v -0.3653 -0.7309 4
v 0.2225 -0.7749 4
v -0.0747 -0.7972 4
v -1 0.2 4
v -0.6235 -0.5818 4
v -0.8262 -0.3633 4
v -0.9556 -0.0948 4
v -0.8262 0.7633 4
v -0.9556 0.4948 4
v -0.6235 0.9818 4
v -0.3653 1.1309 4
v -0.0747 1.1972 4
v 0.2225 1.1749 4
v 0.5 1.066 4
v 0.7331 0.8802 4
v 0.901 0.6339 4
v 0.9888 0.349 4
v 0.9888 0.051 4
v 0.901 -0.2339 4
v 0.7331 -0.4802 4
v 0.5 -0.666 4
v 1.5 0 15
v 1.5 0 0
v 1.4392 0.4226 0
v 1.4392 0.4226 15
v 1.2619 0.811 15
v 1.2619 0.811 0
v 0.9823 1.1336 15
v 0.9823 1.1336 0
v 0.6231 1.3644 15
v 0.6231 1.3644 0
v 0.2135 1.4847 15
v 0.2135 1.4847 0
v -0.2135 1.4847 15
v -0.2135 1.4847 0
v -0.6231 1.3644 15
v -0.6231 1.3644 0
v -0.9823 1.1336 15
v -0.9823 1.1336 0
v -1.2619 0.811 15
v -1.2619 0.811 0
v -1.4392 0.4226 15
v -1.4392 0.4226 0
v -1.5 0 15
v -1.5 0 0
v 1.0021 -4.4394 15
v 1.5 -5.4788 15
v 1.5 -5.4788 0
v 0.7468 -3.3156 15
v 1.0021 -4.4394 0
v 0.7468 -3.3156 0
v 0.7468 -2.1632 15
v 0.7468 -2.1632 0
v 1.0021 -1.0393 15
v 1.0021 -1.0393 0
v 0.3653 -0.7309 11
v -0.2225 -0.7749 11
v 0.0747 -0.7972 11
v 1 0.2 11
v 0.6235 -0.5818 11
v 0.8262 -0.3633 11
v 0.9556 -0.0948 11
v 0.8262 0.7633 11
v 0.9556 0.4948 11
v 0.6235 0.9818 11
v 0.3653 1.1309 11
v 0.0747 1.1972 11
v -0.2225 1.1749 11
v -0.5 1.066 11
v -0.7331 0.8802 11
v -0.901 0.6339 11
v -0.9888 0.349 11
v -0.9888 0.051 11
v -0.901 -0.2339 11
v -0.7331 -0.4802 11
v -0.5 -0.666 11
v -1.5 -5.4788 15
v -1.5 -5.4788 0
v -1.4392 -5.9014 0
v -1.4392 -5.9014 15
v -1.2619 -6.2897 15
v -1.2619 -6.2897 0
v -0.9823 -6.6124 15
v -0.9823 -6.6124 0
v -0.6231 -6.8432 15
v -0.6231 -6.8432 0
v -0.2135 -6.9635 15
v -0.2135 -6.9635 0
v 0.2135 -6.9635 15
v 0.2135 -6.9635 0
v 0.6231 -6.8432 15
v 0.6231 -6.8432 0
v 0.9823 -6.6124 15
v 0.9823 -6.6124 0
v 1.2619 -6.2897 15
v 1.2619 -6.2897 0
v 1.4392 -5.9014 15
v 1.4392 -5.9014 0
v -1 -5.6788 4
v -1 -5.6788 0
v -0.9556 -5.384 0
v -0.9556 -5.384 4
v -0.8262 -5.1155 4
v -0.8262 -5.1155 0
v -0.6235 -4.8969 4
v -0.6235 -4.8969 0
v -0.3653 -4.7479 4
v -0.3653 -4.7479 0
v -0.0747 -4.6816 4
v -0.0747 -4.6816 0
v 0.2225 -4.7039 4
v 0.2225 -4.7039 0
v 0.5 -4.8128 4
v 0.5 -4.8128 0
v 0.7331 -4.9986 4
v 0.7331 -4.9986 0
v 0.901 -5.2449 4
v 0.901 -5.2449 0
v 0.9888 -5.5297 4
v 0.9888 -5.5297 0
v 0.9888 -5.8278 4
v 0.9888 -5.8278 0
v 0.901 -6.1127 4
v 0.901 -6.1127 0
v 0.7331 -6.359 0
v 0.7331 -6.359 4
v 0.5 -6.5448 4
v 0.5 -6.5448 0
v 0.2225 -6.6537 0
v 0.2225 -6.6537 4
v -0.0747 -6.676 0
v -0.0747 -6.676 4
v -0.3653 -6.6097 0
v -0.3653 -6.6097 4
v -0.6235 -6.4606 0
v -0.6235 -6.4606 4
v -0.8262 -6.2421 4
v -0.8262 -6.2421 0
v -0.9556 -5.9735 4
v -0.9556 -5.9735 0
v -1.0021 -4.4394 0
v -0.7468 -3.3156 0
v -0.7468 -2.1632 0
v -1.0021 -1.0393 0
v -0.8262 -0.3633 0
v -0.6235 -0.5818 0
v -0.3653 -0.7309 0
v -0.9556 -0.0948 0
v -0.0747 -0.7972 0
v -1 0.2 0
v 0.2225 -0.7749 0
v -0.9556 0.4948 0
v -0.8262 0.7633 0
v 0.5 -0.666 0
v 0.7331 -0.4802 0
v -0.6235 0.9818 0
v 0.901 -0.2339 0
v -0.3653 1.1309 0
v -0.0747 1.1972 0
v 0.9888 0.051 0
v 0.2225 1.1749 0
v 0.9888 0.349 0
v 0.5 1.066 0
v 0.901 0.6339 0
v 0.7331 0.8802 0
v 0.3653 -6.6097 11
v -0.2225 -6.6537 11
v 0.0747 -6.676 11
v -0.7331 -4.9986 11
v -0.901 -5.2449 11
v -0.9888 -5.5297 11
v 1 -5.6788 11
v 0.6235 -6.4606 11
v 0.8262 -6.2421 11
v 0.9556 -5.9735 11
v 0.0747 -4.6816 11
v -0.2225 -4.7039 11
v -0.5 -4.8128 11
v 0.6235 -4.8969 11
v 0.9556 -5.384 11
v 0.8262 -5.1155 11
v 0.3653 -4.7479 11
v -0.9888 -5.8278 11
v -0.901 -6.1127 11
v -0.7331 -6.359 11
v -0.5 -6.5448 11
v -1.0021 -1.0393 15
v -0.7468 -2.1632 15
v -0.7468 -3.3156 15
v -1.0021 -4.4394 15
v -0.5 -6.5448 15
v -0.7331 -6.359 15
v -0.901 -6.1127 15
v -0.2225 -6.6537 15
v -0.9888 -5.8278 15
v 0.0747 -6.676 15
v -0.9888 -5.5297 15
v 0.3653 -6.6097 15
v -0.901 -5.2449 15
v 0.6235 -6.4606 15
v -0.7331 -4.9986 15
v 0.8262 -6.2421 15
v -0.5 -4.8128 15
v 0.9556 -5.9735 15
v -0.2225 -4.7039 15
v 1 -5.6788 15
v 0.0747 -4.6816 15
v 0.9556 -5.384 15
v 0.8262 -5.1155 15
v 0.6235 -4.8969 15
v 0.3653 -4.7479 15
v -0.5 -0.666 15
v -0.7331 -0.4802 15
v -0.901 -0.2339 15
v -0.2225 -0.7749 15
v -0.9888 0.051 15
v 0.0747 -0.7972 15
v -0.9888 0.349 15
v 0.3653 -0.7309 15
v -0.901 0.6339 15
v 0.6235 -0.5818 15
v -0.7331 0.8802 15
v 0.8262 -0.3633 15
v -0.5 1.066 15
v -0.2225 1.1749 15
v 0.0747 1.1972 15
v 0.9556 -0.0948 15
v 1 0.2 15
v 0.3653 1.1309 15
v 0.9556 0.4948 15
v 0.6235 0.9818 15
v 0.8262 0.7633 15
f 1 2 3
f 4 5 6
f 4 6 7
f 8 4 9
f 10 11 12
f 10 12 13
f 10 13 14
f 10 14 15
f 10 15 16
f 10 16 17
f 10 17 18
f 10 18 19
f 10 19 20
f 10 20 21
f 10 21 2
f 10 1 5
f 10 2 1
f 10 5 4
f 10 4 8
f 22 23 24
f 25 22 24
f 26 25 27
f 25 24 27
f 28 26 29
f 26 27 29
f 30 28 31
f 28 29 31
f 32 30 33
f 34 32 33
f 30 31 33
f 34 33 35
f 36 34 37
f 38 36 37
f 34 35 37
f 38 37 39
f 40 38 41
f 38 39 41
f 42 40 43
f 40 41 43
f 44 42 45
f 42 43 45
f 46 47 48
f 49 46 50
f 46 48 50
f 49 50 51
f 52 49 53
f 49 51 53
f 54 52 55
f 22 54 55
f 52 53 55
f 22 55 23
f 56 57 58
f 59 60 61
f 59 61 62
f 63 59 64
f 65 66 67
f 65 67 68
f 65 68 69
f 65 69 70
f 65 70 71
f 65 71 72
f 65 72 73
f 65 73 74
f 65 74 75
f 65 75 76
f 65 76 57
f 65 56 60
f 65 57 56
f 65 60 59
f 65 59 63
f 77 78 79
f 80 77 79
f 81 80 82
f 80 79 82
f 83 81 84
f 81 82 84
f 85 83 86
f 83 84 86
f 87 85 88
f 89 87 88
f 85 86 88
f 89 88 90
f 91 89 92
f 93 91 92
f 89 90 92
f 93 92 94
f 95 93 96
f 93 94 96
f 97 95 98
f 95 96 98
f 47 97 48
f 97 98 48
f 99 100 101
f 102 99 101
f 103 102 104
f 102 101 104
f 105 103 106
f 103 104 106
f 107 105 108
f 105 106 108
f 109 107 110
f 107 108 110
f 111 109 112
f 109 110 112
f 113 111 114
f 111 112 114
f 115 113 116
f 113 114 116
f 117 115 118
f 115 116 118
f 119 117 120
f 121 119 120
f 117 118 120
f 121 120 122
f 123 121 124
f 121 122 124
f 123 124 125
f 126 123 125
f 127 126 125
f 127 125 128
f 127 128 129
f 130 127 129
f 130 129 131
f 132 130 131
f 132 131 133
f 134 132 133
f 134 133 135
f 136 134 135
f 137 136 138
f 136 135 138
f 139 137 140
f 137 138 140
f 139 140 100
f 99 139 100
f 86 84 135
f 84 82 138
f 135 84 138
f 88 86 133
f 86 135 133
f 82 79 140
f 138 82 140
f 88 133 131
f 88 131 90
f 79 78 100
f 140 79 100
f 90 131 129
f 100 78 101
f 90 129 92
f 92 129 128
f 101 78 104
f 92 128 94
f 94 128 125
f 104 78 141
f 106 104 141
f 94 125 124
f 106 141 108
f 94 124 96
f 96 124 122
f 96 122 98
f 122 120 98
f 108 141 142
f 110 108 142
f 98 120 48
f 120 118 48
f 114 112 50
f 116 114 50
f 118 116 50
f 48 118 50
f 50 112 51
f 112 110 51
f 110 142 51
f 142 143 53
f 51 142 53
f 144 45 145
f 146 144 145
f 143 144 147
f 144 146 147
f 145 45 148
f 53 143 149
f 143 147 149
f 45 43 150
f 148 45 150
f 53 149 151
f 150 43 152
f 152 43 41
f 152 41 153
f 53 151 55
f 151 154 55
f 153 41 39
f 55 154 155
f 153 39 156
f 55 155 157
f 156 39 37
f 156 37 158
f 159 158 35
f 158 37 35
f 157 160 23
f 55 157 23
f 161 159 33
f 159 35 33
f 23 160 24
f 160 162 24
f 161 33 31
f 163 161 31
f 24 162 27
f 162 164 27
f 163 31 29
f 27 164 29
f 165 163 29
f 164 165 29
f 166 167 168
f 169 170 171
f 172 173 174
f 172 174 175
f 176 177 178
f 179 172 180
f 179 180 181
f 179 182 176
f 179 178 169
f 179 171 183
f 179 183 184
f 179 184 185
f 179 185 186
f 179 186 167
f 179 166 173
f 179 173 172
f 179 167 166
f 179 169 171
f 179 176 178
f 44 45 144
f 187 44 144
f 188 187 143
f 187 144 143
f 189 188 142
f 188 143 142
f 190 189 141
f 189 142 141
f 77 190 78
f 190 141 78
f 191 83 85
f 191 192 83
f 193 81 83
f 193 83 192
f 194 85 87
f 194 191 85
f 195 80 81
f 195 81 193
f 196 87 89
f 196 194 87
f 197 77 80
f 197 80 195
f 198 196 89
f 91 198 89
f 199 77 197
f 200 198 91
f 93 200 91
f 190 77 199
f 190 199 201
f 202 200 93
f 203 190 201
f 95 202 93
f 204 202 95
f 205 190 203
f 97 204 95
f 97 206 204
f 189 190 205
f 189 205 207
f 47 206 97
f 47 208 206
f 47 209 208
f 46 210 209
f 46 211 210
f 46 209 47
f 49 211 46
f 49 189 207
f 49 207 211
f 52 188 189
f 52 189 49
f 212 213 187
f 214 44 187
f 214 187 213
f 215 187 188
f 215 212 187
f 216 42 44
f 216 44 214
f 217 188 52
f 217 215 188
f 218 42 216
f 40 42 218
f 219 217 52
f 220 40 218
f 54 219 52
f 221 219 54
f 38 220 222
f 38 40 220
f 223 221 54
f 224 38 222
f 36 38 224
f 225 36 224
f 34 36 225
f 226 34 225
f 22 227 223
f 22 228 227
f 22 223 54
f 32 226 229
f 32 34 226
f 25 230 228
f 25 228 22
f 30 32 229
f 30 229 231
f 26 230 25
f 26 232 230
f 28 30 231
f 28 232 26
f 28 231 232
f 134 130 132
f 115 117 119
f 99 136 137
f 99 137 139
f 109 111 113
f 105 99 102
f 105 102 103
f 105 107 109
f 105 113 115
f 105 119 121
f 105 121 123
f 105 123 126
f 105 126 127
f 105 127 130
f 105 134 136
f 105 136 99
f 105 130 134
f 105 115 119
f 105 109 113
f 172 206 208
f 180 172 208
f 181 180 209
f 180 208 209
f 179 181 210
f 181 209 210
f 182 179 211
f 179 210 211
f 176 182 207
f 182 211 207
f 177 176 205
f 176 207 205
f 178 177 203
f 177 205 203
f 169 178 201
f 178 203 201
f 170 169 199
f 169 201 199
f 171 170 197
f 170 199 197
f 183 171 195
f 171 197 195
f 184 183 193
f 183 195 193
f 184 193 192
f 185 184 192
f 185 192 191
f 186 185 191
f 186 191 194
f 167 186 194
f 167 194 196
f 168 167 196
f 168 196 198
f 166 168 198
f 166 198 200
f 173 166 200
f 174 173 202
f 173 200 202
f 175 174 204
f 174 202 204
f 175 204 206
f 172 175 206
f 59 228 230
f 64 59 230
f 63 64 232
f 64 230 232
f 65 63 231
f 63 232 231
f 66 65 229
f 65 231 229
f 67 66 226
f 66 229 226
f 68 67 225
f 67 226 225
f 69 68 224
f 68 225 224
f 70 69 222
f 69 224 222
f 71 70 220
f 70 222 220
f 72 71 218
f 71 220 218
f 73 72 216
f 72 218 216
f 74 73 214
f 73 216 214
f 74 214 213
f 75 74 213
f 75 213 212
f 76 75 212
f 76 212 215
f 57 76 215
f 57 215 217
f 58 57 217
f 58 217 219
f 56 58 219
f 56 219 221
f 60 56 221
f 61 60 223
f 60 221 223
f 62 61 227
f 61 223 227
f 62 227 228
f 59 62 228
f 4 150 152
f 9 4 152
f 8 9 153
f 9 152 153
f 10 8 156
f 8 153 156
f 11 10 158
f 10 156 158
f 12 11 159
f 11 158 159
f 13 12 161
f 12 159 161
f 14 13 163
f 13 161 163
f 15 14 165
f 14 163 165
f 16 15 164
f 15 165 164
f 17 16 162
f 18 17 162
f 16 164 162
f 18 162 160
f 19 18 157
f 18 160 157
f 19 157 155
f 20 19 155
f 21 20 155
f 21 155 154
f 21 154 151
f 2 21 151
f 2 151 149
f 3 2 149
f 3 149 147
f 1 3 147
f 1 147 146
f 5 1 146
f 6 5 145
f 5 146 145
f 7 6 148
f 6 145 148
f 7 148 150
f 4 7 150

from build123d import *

# Parameters (mm, degrees)
BOSS_EXTRUDE1_DEPTH = 15
SKETCH2_R           = 1
CUT_EXTRUDE1_DEPTH  = 4
SKETCH3_R           = 1
CUT_EXTRUDE2_DEPTH  = 4


with BuildPart() as part:
    # Sketch1 → Boss-Extrude1 (new body)
    with BuildSketch(Plane.XY):
        with BuildLine():
            ThreePointArc((1.5, 0), (0, 1.5), (-1.5, 0))
            ThreePointArc((-1.5, 0), (-0.714591942, -2.739389257), (-1.5, -5.478778514))
            ThreePointArc((-1.5, -5.478778514), (0, -6.978778514), (1.5, -5.478778514))
            ThreePointArc((1.5, -5.478778514), (0.714591942, -2.739389257), (1.5, 0))
        make_face()
    extrude(amount=BOSS_EXTRUDE1_DEPTH)

    # Sketch2 → Cut-Extrude1 (cut)
    with BuildSketch(Plane.XY.offset(15)):
        with Locations((0, 0.2)):
            Circle(SKETCH2_R)
        with Locations((0, -5.678778514)):
            Circle(SKETCH2_R)
    extrude(amount=-CUT_EXTRUDE1_DEPTH, mode=Mode.SUBTRACT)

    # Sketch3 → Cut-Extrude2 (cut)
    with BuildSketch(Plane(origin=(0, 0, 0), x_dir=(-1, 0, 0), z_dir=(0, 0, -1))):
        with Locations((0, 0.2)):
            Circle(SKETCH3_R)
        with Locations((0, -5.678778514)):
            Circle(SKETCH3_R)
    extrude(amount=-CUT_EXTRUDE2_DEPTH, mode=Mode.SUBTRACT)


solid = part.part
